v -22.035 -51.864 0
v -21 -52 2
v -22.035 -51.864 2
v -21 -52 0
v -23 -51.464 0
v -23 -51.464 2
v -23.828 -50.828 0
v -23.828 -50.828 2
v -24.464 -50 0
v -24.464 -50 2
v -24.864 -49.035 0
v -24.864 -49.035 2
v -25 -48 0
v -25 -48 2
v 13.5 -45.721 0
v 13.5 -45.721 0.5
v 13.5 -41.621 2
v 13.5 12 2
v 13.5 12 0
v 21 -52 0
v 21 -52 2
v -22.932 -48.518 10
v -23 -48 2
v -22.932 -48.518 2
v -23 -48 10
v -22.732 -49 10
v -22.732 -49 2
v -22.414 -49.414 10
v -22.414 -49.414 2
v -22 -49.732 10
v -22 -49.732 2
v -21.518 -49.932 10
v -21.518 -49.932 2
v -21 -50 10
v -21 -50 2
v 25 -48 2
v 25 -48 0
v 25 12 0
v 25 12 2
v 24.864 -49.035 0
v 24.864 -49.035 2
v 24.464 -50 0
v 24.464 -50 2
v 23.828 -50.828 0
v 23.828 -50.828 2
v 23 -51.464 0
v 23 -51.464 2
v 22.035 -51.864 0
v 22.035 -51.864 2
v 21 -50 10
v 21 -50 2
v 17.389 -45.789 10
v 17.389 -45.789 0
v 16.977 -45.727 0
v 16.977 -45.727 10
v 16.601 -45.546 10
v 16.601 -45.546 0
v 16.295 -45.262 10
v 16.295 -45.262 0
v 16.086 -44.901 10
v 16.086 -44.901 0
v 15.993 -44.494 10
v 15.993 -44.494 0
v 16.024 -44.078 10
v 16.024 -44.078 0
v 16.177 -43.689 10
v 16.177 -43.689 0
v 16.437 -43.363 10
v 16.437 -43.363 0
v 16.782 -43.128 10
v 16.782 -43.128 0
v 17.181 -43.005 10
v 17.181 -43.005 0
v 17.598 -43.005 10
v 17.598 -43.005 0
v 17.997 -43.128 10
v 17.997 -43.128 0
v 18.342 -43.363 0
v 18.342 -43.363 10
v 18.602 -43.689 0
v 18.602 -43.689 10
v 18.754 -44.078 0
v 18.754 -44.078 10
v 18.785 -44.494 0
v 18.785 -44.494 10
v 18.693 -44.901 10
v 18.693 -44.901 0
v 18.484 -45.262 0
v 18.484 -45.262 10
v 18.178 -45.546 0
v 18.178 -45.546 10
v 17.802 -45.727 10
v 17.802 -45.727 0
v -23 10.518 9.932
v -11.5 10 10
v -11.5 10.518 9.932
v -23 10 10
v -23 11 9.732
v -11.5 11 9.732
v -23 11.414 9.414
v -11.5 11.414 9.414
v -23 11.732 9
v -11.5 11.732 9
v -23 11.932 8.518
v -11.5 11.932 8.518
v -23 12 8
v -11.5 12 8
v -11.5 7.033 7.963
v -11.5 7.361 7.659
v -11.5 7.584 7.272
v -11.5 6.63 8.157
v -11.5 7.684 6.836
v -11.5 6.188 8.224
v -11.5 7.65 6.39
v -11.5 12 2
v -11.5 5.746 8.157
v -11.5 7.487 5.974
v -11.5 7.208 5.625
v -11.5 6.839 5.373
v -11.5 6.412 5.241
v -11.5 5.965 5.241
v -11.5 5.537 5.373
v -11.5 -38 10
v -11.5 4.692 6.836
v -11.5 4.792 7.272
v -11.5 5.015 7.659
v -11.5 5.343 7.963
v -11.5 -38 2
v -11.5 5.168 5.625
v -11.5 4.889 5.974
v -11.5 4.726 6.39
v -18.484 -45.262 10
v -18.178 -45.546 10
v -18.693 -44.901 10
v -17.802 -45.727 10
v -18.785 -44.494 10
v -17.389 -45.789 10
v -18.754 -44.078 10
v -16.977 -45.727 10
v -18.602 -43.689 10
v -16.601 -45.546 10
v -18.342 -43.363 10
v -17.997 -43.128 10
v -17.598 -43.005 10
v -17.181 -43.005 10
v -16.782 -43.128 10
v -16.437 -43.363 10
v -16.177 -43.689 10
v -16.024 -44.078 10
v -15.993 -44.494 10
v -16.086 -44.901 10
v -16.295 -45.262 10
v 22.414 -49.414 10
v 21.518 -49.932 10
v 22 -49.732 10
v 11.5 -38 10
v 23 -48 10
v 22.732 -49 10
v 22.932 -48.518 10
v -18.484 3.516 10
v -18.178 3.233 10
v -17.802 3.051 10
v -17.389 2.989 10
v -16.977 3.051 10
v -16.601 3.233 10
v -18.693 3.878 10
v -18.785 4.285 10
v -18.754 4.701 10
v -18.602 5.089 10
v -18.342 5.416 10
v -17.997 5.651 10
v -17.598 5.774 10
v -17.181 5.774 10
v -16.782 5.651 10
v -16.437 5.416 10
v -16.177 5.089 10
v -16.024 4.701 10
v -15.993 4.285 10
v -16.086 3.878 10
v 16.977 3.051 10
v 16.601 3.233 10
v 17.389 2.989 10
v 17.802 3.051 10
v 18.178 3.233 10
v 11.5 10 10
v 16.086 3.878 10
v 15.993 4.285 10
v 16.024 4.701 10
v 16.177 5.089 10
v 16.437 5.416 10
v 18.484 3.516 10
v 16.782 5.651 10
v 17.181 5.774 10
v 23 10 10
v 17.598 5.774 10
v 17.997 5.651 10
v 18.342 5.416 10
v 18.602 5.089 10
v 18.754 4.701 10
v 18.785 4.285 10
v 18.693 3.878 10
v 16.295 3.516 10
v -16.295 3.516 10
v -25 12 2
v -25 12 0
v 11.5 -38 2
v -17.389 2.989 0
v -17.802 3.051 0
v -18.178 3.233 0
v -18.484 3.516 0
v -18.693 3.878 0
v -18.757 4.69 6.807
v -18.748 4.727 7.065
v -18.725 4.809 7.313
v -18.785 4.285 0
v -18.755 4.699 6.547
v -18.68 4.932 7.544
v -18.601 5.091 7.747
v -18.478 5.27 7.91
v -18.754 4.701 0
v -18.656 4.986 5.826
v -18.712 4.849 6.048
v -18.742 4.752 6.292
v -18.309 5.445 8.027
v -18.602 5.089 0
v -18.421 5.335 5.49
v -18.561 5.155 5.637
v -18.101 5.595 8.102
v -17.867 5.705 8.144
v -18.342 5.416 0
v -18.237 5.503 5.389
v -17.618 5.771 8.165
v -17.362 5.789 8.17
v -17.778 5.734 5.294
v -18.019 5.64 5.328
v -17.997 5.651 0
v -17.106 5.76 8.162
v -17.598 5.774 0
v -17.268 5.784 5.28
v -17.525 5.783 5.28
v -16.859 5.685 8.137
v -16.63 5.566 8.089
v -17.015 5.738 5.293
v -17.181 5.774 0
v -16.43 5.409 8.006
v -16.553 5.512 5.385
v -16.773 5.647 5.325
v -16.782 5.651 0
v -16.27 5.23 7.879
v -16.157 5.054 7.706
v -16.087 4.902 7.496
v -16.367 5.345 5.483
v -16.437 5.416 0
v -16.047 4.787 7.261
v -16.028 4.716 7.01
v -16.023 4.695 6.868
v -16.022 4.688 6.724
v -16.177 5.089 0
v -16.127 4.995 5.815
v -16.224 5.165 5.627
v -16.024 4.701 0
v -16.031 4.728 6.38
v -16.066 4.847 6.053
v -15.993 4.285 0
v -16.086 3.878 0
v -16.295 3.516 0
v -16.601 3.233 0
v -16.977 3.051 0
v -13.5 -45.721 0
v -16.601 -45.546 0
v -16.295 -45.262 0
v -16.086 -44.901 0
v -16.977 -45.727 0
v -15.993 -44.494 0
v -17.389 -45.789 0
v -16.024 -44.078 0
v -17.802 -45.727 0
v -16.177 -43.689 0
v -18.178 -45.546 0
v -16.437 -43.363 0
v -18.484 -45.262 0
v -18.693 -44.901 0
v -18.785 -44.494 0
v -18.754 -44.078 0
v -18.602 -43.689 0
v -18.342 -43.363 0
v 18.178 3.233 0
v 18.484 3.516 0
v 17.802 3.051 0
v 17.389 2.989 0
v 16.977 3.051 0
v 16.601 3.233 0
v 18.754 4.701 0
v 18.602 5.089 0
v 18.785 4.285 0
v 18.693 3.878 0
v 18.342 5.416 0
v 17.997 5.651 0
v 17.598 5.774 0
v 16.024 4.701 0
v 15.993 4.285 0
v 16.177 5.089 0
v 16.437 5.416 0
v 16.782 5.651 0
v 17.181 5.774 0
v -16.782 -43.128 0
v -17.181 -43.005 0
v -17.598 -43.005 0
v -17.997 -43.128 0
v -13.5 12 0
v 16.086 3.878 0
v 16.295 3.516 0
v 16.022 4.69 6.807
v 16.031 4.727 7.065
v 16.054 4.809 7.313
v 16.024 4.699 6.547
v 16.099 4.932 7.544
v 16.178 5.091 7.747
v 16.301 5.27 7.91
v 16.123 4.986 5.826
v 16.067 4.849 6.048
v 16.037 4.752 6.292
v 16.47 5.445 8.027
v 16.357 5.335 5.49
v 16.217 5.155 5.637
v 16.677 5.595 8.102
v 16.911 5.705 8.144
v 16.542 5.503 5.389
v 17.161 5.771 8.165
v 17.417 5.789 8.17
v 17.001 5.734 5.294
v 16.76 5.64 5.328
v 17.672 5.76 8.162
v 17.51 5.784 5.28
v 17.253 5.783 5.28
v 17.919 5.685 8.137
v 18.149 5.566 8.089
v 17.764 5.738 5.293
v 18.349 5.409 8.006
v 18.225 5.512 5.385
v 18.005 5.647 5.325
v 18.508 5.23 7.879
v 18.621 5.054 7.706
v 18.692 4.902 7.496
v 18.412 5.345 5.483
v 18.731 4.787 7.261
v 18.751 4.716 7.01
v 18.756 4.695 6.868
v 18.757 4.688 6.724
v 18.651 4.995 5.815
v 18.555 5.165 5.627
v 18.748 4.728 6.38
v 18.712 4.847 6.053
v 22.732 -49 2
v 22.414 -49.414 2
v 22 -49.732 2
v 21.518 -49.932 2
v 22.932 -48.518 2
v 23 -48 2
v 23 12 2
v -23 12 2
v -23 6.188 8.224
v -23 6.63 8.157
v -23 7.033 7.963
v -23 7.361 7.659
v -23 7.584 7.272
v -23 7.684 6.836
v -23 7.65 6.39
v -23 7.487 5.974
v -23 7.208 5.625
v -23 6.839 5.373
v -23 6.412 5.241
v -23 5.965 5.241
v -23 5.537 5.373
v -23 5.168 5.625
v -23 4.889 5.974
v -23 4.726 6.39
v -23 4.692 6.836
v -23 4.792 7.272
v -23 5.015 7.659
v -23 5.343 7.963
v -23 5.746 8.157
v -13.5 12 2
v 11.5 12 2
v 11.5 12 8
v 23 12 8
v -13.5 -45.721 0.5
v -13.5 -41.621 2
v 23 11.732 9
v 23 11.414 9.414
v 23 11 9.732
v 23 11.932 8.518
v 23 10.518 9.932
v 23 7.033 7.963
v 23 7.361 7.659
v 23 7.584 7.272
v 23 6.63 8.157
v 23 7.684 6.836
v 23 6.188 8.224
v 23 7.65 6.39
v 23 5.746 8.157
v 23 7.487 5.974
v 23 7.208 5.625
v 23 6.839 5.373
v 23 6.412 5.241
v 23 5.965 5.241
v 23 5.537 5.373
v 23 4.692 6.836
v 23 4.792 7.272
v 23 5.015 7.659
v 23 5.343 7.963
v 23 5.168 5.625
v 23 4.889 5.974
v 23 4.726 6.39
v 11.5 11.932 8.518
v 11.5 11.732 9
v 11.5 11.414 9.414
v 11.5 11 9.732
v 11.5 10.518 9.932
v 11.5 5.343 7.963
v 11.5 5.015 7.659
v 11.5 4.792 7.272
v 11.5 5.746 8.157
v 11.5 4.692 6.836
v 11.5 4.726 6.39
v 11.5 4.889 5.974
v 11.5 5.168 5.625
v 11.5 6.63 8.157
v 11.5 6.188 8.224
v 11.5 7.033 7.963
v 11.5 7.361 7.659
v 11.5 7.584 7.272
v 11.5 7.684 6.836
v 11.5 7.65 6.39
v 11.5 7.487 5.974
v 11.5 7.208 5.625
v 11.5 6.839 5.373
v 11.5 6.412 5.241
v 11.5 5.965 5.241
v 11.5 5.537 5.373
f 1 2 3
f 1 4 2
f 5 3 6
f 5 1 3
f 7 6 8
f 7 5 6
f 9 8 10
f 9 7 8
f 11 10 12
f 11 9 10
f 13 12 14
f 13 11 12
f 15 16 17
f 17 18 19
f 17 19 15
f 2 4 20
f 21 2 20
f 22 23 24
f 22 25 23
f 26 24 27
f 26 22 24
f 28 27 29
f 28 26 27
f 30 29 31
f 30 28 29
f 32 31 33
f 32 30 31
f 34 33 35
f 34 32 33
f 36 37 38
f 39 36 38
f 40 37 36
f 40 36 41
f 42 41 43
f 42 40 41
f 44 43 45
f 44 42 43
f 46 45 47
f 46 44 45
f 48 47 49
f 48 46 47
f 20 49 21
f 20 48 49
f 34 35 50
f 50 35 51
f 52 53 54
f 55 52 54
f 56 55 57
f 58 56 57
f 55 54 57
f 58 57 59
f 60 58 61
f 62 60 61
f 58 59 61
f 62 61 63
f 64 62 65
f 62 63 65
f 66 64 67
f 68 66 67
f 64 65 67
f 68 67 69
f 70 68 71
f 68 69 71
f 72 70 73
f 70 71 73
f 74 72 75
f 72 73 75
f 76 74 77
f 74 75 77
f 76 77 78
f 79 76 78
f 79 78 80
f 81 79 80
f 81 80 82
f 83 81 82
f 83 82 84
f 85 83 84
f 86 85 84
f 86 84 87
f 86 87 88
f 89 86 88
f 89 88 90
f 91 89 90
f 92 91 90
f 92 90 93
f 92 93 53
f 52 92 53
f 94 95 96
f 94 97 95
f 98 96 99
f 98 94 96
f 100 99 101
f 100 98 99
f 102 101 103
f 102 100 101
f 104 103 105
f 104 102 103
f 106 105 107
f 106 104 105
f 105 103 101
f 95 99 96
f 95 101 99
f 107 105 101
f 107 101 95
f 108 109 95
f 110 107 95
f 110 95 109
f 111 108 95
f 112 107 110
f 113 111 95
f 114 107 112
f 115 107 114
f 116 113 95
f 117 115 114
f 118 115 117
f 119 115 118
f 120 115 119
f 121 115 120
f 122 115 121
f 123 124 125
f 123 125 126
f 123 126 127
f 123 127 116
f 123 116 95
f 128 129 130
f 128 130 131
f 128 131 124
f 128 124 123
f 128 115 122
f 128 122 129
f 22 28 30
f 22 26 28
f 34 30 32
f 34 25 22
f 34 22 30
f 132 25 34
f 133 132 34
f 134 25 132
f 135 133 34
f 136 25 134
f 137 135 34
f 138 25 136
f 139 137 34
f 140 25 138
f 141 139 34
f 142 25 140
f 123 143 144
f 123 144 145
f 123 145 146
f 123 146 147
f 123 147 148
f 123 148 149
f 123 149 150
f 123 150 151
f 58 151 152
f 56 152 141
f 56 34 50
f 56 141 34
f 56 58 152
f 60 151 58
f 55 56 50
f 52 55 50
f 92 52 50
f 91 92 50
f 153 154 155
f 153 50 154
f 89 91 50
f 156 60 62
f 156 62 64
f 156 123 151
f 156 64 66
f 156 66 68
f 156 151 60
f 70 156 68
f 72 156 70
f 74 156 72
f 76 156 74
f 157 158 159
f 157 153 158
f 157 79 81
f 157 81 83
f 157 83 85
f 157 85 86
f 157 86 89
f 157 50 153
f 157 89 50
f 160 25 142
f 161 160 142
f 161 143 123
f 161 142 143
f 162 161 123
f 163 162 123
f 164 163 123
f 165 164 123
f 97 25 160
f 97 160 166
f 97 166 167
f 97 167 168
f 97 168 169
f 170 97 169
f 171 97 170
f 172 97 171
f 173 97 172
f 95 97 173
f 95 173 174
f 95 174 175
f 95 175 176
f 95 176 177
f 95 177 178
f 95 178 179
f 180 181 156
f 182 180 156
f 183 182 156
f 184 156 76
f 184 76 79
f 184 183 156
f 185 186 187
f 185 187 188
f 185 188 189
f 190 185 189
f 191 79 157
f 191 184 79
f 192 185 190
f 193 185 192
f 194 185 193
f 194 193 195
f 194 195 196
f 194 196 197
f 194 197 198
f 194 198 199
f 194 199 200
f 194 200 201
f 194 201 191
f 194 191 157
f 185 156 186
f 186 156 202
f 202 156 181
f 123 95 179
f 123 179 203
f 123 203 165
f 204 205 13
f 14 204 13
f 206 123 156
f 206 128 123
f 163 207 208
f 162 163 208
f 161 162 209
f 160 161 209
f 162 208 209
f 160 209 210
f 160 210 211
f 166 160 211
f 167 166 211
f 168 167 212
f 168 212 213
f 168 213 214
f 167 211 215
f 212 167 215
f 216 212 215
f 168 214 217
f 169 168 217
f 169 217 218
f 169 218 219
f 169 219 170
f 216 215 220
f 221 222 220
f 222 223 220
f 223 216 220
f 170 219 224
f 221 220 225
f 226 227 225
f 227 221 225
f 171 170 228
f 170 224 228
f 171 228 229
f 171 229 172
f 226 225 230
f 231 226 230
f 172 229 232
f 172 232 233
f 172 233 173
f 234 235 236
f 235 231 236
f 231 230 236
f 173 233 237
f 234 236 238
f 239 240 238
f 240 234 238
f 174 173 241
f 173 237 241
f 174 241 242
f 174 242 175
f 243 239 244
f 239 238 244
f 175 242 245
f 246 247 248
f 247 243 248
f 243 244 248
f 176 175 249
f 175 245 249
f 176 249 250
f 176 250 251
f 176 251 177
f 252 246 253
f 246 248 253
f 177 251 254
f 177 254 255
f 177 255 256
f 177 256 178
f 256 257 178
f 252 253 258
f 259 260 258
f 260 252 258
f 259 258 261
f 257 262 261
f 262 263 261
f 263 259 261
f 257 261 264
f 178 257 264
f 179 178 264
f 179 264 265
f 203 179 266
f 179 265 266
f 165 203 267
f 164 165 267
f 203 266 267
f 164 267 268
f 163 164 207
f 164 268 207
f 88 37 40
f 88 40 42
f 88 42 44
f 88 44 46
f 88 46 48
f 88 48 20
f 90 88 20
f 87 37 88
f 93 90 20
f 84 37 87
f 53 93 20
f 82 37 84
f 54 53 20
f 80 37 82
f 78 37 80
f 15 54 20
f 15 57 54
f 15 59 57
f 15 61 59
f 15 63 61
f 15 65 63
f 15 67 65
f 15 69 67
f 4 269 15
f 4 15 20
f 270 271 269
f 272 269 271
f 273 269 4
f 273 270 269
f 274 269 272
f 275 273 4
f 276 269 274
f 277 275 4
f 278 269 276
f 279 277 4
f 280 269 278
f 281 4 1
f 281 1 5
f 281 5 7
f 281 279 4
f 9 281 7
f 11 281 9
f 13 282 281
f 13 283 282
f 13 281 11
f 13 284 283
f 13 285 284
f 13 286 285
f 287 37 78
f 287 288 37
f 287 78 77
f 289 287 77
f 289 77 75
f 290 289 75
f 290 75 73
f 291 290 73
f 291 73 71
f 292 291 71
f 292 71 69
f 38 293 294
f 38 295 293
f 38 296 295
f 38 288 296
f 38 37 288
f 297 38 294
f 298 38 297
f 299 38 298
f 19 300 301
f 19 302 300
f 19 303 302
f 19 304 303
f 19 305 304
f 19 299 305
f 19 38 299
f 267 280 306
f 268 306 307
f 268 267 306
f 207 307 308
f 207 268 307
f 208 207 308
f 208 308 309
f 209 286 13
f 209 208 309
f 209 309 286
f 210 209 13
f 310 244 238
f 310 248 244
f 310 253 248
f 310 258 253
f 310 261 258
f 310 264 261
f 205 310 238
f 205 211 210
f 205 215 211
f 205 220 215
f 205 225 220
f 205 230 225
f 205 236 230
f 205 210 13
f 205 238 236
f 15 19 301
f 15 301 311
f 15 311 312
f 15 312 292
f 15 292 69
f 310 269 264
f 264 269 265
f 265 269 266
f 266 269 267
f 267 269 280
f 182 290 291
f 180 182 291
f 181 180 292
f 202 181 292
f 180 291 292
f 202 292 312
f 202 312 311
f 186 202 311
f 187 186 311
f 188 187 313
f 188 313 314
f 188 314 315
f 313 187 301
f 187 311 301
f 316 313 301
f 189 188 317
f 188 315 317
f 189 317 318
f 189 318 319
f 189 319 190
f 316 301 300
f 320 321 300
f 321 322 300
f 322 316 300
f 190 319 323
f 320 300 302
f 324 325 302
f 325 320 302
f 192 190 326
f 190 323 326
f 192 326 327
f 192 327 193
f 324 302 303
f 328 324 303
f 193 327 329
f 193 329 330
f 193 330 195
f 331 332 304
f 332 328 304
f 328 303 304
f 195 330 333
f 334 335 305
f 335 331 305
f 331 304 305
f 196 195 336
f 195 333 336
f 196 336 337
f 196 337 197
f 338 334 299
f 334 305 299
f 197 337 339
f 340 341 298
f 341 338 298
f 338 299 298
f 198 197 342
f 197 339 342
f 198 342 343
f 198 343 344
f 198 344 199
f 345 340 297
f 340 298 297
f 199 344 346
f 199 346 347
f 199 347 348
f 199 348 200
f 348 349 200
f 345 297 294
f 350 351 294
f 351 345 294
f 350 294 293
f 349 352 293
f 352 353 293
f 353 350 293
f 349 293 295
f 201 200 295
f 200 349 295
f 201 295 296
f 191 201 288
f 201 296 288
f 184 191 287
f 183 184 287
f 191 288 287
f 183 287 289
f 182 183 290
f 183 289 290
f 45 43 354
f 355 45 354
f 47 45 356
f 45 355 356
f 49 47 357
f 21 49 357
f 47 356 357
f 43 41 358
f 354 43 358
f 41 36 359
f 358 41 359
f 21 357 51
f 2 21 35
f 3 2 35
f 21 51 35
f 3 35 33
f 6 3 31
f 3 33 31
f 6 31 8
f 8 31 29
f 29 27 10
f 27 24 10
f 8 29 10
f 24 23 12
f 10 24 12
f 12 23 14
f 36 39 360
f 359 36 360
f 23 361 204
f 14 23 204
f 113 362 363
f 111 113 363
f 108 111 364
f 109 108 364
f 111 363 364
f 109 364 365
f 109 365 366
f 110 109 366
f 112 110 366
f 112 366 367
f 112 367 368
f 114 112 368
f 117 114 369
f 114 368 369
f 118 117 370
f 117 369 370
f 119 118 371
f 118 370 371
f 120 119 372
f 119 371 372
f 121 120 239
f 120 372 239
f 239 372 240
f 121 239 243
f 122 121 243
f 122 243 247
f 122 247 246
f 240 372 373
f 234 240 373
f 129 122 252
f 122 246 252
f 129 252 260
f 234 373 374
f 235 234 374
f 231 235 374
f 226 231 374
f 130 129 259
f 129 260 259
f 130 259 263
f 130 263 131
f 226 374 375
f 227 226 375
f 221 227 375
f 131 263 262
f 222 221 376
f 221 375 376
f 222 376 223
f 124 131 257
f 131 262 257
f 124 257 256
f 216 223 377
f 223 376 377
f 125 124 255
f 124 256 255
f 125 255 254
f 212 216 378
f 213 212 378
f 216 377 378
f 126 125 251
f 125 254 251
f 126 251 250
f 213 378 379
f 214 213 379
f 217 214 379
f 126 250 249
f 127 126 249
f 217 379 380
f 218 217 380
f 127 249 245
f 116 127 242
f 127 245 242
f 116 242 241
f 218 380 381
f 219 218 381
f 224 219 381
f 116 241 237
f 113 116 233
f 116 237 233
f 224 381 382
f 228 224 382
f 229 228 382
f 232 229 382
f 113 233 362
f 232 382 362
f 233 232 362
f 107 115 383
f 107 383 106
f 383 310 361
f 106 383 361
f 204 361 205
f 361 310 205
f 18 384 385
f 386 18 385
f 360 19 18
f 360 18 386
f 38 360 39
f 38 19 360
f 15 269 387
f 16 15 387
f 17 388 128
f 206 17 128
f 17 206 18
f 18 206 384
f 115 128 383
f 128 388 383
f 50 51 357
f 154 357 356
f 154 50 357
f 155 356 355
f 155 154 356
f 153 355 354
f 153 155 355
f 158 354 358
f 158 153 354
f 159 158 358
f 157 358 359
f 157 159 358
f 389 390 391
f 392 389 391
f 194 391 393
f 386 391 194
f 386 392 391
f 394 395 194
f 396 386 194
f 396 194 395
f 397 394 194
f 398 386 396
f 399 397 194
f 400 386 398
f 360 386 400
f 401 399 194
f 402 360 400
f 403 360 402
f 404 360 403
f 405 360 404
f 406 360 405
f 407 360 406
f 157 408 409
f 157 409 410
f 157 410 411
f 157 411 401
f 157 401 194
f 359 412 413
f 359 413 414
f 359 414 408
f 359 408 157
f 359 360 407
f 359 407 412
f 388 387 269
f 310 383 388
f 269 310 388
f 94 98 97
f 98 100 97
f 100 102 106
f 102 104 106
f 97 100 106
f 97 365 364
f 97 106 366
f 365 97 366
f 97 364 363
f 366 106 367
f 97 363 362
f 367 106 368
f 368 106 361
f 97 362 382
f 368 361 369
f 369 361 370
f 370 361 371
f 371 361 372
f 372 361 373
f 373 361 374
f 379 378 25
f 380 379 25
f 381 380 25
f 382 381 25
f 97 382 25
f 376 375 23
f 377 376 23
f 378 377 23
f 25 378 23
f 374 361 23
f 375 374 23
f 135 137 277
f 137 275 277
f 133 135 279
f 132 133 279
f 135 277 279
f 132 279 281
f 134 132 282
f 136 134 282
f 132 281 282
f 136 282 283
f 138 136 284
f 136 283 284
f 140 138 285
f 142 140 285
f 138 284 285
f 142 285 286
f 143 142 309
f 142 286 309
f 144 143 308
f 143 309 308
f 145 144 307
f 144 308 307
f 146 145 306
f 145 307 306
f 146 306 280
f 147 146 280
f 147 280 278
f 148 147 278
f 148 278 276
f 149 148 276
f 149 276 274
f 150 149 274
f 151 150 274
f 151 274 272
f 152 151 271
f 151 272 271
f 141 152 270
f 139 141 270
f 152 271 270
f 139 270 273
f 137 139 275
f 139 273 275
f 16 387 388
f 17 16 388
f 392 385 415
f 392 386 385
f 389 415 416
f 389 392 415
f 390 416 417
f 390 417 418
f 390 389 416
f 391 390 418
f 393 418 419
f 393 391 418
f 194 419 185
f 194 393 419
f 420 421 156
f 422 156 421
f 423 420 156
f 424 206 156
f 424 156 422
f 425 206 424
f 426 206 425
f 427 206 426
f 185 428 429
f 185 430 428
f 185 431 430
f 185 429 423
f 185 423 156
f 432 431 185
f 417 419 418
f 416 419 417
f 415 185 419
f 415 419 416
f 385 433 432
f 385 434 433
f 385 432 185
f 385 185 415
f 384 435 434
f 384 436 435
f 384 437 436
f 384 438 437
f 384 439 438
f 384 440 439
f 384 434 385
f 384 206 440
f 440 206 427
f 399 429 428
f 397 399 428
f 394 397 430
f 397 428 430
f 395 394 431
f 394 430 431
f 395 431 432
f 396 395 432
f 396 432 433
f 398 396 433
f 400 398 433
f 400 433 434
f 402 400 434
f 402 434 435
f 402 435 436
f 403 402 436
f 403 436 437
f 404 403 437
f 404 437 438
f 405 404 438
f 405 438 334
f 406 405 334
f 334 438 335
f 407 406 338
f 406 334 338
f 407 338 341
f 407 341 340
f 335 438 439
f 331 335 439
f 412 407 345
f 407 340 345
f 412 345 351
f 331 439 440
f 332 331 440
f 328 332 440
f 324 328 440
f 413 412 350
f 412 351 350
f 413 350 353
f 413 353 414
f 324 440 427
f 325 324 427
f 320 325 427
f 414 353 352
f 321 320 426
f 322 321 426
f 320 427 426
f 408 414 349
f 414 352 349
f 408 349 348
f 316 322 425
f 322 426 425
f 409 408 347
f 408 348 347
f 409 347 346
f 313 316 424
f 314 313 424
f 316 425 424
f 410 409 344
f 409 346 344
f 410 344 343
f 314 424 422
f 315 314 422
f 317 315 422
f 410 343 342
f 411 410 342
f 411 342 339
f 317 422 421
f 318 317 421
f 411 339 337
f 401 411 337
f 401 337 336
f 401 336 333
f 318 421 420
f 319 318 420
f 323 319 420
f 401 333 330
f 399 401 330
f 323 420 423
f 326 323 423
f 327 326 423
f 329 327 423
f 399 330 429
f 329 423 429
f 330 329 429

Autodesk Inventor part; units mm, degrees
ref_plane "YZ Plane" through (0, 0, 0) normal (1, 0, 0) x (0, 1, 0)
ref_plane "XZ Plane" through (0, 0, 0) normal (0, 1, 0) x (-1, 0, 0)
ref_plane "XY Plane" through (0, 0, 0) normal (0, 0, 1) x (1, 0, 0)
sketch "Skizze1" plane through (0, 0, 0) normal (0, 0, 1) x (1, 0, 0)
  line L0 (11.5, 38) -> (-11.5, 38)
  line L1 (-11.5, 38) -> (-11.5, -38)
  line L2 (-11.5, -38) -> (11.5, -38)
  line L3 (11.5, -38) -> (11.5, 38)
  line L4 (11.5, 38) -> (-11.5, -38) construction
  line L5 (-11.5, 38) -> (11.5, -38) construction
  line L6 (-23, -50) -> (23, -50)
  line L7 (23, -50) -> (23, -38)
  line L8 (23, -38) -> (-23, -38)
  line L9 (-23, -38) -> (-23, -50)
  line L10 (-23, -50) -> (23, -38) construction
  line L11 (23, -50) -> (-23, -38) construction
  line L12 (-23, -38) -> (-11.5, -38)
  line L13 (-11.5, -38) -> (-11.5, 12)
  line L14 (-11.5, 12) -> (-23, 12)
  line L15 (-23, 12) -> (-23, -38)
  line L16 (23, -38) -> (11.5, -38)
  line L17 (11.5, -38) -> (11.5, 12)
  line L18 (11.5, 12) -> (23, 12)
  line L19 (23, 12) -> (23, -38)
  point P0 (0, 0)
  point P1 (0, -44)
  point P2 (0, -38)
  dimension "d0" = 23
  dimension "d1" = 76
  dimension "d2" = 12
  dimension "d3" = 50
  dimension "d4" = 50
  dimension "d5" = 46
extrude "Extrusion1" add sketch "Skizze1" along normal blind 10 contours L18 L19 L8 L3 | L1 L8 L15 L14 | L8 L7 L6 L9 L2
sketch "Skizze2" plane through (-11.5, -38, 0) normal (1, 0, 0) x (0, 0, -1)
  line L0 (0, 50) -> (0, -12) projected
  line L1 (0, -7.7211) -> (-0.5, -7.7211)
  line L2 (-0.5, -7.7211) -> (-2, -3.621)
  line L3 (-2, -3.621) -> (-2, 50)
  line L4 (-2, 50) -> (0, 50)
  line L5 (0, 0) -> (0, 50) projected
  point P0 (0, 38)
  point P1 (0, 5.0638)
  dimension "d8" = 0.5
  dimension "d15" = 2
extrude "Extrusion2" cut sketch "Skizze2" along normal blind 25 and the other way blind 2
sketch "Skizze3" plane through (-23, -50, 0) normal (-1, 0, 0) x (0, 0, 1)
  line L0 (0, 62) -> (0, 0) projected
  line L1 (0, 0) -> (10, 0) projected
  line L2 (10, 62) -> (10, 0) projected
  line L3 (0, 62) -> (10, 62) projected
  circle A0 centre (6.7241, 56.1881) radius 1.5
  point P0 (0, 50)
  dimension "d11" = 3
extrude "Extrusion3" cut sketch "Skizze3" against normal through all contours A0
fillet "Rundung1" radius 2 4 edges at (17.25, 12, 10) (-17.25, 12, 10) (-23, -50, 5) (23, -50, 5)
sketch "Skizze4" plane through (0, 0, 0) normal (0, 0, -1) x (-1, 0, 0)
  arc A0 (-23, -48) -> (-21, -50) centre (-21, -48) ccw projected
  line L0 (21, -50) -> (-21, -50) projected
  arc A1 (21, -50) -> (23, -48) centre (21, -48) ccw projected
  line L1 (23, 12) -> (23, -48) projected
  line L2 (13.5, 12) -> (23, 12) projected
  line L3 (13.5, 12) -> (13.5, -45.7211) projected
  line L4 (13.5, -45.7211) -> (-13.5, -45.7211) projected
  line L5 (-13.5, -45.7211) -> (-13.5, 12) projected
  line L6 (-23, 12) -> (-13.5, 12) projected
  line L7 (-23, -48) -> (-23, 12) projected
  line L8 (-25, 14) -> (-11.5, 14)
  line L9 (-11.5, 14) -> (-11.5, -43.7211)
  line L10 (-11.5, -43.7211) -> (11.5, -43.7211)
  line L11 (11.5, -43.7211) -> (11.5, 14)
  line L12 (11.5, 14) -> (25, 14)
  line L13 (25, 14) -> (25, -48)
  arc A2 (21, -52) -> (25, -48) centre (21, -48) ccw
  line L14 (21, -52) -> (-21, -52)
  arc A3 (-25, -48) -> (-21, -52) centre (-21, -48) ccw
  line L15 (-25, -48) -> (-25, 14)
  line L16 (-23, 12) -> (-25, 12)
  line L17 (23, 12) -> (25, 12)
  point P0 (0, 0)
  dimension "d18" = 2
extrude "Extrusion4" add sketch "Skizze4" against normal blind 2 contours A0 L0 A1 L1 L17 L13 A2 L14 A3 L15 L16 L7
sketch "Skizze5" plane through (0, 0, 10) normal (0, 0, 1) x (1, 0, 0)
  arc A0 (21, -50) -> (23, -48) centre (21, -48) ccw projected
  line L0 (23, -48) -> (23, 10) projected
  line L1 (11.5, 10) -> (23, 10) projected
  line L2 (11.5, 10) -> (11.5, -38) projected
  line L3 (11.5, -38) -> (-11.5, -38) projected
  line L4 (-11.5, -38) -> (-11.5, 10) projected
  line L5 (-23, 10) -> (-11.5, 10) projected
  line L6 (-23, 10) -> (-23, -48) projected
  arc A1 (-23, -48) -> (-21, -50) centre (-21, -48) ccw projected
  line L7 (-21, -50) -> (21, -50) projected
  line L8 (-17.3893, -44.3893) -> (-17.3893, 4.3893)
  line L9 (-17.3893, 4.3893) -> (-17.1107, 4.3893)
  line L10 (-17.1107, 4.3893) -> (-17.1107, -43.6107)
  line L11 (-17.1107, -43.6107) -> (17.1107, -43.6107)
  line L12 (17.1107, -43.6107) -> (17.1107, 4.3893)
  line L13 (17.1107, 4.3893) -> (17.3893, 4.3893)
  line L14 (17.3893, 4.3893) -> (17.3893, -44.3893)
  line L15 (17.3893, -44.3893) -> (-17.3893, -44.3893)
  point P0 (0, 0)
hole "Bohrung1" at (-17.3893, -44.3893, 10) at (17.3893, -44.3893, 10) at (17.3893, 4.3893, 10) at (-17.3893, 4.3893, 10) direction (0, 0, -1) diameter 2.8 depth 12 tip angle 118
properties part number "Anglerfish_coverslipclamp_top"
